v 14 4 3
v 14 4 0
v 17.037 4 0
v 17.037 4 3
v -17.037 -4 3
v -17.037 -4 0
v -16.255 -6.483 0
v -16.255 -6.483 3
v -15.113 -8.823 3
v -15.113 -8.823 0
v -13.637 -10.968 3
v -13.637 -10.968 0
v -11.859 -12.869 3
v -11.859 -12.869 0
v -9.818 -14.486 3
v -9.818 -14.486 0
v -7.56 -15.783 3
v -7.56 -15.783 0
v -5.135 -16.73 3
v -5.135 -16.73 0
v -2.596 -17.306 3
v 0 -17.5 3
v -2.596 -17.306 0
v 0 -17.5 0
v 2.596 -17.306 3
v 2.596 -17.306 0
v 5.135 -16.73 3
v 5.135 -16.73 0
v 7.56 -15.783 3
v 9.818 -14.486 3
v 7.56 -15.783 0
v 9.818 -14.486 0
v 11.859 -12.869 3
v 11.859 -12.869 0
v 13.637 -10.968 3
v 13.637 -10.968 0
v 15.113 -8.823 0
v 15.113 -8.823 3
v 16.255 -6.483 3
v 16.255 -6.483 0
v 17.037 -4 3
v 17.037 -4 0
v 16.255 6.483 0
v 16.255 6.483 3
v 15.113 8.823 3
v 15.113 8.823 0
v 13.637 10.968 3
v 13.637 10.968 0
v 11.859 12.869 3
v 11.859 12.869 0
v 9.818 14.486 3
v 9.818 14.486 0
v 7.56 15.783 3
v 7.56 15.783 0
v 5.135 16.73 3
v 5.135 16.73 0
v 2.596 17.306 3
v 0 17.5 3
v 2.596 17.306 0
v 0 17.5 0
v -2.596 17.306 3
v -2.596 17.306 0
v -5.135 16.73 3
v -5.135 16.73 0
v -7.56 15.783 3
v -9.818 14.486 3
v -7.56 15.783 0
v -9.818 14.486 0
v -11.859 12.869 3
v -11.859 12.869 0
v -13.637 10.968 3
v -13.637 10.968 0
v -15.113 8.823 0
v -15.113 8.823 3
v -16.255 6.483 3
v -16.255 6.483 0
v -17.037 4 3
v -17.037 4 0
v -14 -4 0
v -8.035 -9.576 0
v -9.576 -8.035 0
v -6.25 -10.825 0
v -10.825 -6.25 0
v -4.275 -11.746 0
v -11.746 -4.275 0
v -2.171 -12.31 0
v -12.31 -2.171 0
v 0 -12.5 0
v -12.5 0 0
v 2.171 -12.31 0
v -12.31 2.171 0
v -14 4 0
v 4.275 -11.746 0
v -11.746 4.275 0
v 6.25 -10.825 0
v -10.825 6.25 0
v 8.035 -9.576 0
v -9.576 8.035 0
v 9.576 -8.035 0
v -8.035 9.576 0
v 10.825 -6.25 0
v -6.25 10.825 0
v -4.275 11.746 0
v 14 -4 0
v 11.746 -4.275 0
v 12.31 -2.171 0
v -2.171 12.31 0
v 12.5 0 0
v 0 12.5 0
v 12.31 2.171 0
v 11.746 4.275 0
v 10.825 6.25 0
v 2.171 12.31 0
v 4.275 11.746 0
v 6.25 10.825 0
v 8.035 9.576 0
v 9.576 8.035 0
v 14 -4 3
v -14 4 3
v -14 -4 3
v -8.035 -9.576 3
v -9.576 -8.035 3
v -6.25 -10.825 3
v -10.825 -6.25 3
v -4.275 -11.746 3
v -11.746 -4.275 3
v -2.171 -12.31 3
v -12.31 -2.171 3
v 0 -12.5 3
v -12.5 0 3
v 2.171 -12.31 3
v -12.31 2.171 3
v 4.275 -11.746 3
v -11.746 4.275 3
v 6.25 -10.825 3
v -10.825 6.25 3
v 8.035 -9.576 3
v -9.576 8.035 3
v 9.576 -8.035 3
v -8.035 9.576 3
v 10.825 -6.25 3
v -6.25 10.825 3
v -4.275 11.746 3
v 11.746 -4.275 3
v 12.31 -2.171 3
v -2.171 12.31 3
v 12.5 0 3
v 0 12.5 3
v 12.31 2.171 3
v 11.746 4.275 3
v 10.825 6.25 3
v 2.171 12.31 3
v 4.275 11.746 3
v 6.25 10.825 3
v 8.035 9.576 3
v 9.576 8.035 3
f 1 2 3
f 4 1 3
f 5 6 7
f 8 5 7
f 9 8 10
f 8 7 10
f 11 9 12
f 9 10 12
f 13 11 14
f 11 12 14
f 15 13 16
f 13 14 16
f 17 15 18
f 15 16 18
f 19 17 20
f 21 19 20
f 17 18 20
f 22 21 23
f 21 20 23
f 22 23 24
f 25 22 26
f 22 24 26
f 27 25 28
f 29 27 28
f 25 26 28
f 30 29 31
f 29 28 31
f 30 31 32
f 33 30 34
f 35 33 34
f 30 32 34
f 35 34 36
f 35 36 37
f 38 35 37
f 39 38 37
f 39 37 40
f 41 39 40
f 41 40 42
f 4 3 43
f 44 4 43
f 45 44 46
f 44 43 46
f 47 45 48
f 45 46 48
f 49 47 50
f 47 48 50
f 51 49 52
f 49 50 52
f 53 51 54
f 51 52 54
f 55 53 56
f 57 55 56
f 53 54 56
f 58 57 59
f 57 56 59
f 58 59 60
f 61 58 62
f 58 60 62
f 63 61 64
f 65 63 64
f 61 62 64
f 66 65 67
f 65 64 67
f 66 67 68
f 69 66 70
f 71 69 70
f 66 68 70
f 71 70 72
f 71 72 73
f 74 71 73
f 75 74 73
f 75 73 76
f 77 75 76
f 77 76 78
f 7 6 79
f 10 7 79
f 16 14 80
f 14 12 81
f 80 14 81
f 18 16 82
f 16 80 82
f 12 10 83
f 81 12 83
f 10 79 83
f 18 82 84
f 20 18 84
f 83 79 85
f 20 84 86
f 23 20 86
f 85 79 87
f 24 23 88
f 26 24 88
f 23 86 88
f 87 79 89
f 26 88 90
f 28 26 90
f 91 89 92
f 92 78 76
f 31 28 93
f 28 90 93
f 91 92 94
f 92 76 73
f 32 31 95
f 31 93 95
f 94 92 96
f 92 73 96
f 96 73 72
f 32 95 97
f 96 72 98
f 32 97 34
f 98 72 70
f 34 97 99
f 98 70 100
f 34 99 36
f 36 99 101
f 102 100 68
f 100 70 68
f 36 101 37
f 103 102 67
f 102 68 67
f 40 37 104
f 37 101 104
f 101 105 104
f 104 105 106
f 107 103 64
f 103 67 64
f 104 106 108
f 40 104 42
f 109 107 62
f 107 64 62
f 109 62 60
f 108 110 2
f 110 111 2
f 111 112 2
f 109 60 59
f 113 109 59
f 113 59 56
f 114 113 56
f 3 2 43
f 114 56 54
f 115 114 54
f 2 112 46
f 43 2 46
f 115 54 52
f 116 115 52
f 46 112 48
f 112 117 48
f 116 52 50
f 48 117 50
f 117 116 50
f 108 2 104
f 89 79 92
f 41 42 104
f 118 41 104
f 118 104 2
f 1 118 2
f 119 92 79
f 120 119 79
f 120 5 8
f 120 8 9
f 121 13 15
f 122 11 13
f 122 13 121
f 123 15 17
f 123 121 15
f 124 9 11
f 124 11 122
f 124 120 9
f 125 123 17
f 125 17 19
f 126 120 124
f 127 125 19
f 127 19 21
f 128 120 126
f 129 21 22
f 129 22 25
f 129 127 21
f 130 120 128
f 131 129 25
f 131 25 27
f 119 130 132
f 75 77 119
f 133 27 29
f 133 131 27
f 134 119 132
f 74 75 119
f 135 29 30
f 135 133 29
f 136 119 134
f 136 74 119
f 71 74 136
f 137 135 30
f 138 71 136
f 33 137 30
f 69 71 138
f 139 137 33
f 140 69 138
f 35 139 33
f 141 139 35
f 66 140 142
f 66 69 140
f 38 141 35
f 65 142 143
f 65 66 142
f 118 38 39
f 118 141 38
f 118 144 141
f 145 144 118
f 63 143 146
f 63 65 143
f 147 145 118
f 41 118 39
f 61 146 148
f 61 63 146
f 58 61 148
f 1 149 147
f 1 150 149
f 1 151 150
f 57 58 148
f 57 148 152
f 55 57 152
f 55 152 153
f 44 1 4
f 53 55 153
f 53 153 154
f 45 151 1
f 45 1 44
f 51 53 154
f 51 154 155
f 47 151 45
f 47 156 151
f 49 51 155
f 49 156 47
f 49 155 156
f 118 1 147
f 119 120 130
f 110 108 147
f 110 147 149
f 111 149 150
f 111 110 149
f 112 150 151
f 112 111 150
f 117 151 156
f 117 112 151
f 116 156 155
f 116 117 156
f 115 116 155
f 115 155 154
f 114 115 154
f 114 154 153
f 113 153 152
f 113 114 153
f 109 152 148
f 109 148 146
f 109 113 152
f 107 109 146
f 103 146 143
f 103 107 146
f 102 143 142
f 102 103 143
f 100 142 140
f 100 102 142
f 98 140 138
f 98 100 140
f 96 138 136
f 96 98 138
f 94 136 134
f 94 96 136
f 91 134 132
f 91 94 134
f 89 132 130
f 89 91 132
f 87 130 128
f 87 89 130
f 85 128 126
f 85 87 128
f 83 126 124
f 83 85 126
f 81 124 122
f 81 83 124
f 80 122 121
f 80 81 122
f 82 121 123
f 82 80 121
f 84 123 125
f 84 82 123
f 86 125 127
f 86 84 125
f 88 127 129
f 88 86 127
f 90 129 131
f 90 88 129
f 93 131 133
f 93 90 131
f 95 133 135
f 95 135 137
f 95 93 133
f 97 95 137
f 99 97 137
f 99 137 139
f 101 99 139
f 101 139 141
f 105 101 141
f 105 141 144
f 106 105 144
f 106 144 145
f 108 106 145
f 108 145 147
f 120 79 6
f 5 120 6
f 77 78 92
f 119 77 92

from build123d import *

# Parameters (mm, degrees)
F0_R     = 12.5
F1_DEPTH = 3


with BuildPart() as f1:
    # F0 (on Top) → F1 (new body)
    with BuildSketch(Plane.XY):
        with BuildLine():
            Line((-14, -4), (-17.036725, -4))
            ThreePointArc((-17.036725, -4), (0, -17.5), (17.036725, -4))
            Line((17.036725, -4), (14, -4))
            Line((14, -4), (14, 4))
            Line((14, 4), (17.036725, 4))
            ThreePointArc((17.036725, 4), (0, 17.5), (-17.036725, 4))
            Line((-17.036725, 4), (-14, 4))
            Line((-14, 4), (-14, -4))
        make_face()
        Circle(F0_R, mode=Mode.SUBTRACT)
    extrude(amount=F1_DEPTH)


solid = f1.part
